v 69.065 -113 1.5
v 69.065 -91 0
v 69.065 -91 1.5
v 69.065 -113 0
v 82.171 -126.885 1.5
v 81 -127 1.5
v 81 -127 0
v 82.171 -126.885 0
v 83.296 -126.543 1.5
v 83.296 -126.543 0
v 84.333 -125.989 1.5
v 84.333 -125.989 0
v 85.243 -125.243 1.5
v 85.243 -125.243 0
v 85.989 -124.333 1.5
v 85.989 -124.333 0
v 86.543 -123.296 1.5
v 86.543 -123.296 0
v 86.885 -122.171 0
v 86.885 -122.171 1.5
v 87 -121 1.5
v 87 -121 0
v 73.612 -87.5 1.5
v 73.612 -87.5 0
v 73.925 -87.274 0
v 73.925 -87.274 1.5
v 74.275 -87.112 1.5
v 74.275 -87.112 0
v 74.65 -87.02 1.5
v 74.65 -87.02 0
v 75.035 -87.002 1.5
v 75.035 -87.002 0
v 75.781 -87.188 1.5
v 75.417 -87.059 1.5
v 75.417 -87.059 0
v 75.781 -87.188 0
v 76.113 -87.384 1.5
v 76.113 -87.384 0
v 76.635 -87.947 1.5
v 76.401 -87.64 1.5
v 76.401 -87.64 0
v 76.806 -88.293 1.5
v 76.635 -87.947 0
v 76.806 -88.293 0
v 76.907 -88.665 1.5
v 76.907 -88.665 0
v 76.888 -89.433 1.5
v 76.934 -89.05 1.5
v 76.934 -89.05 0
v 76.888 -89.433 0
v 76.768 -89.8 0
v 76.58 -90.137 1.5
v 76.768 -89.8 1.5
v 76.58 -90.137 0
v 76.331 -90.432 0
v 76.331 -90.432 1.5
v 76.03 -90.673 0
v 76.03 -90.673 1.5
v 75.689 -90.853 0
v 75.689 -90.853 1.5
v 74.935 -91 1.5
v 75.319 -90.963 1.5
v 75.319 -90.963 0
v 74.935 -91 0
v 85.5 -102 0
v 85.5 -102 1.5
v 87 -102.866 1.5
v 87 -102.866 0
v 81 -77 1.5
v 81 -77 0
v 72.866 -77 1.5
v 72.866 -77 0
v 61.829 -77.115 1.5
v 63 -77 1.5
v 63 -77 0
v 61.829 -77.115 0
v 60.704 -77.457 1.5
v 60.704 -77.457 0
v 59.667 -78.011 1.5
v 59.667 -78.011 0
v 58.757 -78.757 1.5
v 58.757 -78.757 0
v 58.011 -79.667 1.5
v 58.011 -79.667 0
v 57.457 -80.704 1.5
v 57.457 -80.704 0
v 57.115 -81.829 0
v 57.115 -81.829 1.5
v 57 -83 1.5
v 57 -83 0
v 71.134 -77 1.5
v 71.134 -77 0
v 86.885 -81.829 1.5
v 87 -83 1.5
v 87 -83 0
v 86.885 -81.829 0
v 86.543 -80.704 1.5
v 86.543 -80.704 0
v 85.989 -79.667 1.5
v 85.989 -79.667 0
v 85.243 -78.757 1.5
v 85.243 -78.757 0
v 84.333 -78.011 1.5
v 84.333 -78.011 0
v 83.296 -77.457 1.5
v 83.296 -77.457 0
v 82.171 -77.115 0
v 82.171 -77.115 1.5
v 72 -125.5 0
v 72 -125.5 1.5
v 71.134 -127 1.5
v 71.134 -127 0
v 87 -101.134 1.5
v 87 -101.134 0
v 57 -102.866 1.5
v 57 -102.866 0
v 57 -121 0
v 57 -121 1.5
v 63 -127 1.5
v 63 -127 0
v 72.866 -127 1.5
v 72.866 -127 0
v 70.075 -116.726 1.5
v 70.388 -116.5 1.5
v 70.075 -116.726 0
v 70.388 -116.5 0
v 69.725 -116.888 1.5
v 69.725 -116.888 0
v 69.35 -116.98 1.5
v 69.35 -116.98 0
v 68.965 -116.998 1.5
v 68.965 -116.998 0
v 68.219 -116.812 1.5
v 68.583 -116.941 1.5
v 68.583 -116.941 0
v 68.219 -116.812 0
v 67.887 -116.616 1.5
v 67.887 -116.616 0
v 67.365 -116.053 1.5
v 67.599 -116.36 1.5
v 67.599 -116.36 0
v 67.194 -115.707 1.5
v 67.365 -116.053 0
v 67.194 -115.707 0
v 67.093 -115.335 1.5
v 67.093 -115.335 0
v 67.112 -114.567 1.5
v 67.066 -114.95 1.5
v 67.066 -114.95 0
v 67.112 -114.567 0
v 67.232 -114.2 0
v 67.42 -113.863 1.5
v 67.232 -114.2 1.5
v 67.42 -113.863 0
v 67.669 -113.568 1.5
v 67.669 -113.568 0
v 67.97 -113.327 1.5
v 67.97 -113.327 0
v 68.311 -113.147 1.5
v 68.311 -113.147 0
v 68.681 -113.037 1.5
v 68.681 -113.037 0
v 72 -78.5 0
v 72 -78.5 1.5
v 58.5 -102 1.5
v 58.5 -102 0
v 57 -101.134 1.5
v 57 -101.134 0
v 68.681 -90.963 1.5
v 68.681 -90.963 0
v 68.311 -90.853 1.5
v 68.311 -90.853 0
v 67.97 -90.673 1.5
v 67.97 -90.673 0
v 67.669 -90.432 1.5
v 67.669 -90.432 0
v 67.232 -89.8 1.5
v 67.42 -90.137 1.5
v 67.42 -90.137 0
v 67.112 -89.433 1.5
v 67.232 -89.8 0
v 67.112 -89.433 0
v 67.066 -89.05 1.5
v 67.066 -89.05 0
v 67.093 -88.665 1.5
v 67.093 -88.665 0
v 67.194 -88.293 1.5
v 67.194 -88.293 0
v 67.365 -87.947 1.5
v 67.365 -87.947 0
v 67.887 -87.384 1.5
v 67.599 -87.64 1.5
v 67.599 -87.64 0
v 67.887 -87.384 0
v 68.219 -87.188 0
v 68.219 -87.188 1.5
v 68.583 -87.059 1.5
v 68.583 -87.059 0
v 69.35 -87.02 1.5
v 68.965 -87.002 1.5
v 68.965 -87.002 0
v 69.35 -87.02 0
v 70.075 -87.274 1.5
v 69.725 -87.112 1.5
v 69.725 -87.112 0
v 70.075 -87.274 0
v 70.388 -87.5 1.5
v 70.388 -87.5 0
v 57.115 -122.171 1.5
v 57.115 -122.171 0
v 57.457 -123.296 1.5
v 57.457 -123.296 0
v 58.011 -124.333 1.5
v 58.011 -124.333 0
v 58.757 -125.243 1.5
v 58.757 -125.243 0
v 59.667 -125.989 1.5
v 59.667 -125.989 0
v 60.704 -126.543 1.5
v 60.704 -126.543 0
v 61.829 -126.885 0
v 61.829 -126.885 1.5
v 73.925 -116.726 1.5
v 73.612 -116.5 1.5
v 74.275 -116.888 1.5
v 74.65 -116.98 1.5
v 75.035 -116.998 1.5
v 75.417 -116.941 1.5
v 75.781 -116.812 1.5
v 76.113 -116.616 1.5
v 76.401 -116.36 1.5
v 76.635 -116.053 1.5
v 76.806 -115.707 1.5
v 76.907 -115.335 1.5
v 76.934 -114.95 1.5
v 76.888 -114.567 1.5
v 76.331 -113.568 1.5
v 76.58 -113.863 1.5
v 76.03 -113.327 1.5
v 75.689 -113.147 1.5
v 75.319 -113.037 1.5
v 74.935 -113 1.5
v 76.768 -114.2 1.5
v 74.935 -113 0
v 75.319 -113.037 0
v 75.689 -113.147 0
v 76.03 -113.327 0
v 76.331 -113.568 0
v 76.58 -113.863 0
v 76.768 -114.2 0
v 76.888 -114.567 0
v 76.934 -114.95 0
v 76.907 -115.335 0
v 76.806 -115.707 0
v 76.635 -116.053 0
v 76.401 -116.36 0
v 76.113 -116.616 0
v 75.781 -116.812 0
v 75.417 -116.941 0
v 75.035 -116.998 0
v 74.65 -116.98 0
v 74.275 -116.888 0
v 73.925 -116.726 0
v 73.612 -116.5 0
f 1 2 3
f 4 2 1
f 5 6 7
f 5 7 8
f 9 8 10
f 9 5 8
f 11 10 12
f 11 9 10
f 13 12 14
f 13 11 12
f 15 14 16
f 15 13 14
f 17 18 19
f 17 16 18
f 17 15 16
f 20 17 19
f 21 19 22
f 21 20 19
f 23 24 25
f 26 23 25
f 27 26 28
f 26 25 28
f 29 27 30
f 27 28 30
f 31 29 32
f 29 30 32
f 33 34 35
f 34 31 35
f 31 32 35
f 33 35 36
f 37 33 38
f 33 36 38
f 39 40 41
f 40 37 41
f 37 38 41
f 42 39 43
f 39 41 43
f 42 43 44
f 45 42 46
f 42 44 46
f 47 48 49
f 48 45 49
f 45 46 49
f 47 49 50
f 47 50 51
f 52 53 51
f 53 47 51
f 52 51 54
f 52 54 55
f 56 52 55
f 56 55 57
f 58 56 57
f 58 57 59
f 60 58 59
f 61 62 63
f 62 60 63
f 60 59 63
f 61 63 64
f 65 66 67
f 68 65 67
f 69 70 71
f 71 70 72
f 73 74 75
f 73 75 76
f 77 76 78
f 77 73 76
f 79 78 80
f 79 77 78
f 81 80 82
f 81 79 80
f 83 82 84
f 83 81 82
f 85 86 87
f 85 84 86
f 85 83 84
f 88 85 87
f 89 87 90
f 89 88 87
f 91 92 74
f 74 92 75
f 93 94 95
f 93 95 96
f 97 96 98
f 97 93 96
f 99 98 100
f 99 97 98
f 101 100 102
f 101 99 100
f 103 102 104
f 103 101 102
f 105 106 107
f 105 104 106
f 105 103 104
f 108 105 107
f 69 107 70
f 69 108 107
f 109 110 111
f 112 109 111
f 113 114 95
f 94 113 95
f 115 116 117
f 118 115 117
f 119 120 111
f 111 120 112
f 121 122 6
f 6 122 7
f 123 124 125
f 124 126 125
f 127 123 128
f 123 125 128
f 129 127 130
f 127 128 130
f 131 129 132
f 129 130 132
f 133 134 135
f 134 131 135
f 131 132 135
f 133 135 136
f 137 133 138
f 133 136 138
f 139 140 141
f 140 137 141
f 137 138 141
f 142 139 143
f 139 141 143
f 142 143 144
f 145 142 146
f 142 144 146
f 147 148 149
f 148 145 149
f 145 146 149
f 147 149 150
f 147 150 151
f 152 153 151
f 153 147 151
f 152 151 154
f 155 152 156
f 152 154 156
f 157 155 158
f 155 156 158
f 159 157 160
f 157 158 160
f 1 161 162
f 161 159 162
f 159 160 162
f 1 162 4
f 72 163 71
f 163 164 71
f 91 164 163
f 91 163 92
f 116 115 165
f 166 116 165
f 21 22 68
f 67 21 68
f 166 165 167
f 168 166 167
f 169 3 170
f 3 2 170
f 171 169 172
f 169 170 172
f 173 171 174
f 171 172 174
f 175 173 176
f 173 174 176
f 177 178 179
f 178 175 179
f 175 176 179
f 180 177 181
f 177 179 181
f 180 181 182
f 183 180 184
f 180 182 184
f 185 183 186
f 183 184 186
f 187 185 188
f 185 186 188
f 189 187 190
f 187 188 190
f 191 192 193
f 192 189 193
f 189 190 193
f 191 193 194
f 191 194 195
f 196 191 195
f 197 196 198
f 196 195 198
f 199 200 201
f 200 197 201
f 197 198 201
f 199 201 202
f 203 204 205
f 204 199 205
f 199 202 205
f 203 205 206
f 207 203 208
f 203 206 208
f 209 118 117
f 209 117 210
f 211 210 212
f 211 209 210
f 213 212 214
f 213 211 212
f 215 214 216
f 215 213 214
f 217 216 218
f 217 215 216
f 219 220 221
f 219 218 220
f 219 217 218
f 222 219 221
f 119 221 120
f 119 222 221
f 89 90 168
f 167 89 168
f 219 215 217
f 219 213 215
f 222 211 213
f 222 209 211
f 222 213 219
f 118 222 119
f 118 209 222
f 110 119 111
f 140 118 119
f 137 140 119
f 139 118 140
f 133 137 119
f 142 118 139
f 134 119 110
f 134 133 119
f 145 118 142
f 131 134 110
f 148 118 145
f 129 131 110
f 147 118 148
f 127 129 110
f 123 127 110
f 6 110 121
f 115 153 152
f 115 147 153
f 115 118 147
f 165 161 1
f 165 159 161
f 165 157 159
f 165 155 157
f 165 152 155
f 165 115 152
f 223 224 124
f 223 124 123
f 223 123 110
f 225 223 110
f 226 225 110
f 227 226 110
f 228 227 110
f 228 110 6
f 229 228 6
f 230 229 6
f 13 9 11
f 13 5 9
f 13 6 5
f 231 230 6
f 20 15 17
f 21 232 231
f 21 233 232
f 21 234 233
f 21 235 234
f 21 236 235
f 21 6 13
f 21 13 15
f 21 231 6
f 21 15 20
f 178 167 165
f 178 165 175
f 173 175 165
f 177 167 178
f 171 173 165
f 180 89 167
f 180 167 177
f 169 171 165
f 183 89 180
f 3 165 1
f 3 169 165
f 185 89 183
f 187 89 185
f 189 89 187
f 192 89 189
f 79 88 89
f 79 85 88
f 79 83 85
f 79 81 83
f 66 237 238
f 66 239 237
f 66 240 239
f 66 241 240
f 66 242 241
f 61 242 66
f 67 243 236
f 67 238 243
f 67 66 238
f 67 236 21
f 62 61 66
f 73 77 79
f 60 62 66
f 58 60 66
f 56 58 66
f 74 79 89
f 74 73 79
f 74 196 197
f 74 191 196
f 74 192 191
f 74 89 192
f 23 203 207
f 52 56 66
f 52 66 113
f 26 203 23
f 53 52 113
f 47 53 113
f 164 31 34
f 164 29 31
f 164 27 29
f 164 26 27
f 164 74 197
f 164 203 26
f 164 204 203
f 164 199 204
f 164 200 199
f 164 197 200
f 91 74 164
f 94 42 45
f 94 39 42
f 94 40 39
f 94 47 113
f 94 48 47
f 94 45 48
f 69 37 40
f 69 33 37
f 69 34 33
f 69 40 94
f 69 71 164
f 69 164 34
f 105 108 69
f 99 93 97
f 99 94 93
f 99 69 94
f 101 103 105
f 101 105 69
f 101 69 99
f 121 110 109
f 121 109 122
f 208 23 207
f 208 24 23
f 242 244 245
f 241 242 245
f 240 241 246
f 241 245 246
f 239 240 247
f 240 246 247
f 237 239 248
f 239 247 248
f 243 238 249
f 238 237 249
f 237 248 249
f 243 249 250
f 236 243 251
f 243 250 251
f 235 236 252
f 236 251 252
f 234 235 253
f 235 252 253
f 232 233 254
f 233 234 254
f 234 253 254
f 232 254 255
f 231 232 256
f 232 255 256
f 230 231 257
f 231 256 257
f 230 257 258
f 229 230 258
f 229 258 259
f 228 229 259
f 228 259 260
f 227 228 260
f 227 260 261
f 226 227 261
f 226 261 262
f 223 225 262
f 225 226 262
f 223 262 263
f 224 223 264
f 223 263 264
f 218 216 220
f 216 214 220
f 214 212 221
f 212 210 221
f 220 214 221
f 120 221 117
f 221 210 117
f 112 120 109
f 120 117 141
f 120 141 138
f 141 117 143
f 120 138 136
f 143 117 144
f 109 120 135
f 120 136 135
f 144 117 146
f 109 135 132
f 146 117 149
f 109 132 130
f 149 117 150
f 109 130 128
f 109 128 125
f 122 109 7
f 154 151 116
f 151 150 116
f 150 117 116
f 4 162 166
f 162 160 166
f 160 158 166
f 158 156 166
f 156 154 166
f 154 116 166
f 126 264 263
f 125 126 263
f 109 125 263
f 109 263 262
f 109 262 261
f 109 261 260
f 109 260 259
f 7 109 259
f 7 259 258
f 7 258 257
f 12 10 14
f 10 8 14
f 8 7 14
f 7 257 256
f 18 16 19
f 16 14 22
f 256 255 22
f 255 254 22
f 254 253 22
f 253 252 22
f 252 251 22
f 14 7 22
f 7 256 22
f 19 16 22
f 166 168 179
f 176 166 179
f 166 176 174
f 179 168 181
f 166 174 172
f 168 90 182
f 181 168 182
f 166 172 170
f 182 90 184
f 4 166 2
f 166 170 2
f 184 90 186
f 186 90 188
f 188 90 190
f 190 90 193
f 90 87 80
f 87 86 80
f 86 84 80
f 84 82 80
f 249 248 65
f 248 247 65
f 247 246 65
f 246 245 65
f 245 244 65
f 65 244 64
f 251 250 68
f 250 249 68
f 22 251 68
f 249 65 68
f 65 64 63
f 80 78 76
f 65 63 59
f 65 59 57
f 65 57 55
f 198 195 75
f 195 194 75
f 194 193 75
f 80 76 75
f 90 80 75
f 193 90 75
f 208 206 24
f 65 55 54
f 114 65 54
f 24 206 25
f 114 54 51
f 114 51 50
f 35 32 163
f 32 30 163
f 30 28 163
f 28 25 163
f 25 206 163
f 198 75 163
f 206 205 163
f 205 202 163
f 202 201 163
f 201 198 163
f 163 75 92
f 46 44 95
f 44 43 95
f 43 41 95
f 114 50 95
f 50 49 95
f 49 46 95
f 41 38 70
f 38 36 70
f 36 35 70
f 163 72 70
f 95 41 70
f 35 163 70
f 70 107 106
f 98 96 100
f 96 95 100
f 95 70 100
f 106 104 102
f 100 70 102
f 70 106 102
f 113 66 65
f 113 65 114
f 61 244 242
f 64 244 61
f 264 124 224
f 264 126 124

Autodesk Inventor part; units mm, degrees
ref_plane "YZ Plane" through (0, 0, 0) normal (1, 0, 0) x (0, 1, 0)
ref_plane "XZ Plane" through (0, 0, 0) normal (0, 1, 0) x (-1, 0, 0)
ref_plane "XY Plane" through (0, 0, 0) normal (0, 0, 1) x (1, 0, 0)
sketch "Sketch2" plane through (0, 0, 0) normal (0, 0, 1) x (1, 0, 0)
  line L0 (0, 0) -> (144, 0) construction
  line L1 (144, 0) -> (144, -204) construction
  line L2 (144, -204) -> (0, -204) construction
  line L3 (0, -204) -> (0, 0) construction
  circle A0 centre (135, -27) radius 3 construction
  circle A1 centre (122, -9) radius 3 construction
  circle A2 centre (135, -177) radius 3 construction
  circle A3 centre (122, -195) radius 3 construction
  circle A4 centre (22, -195) radius 3 construction
  circle A5 centre (9, -177) radius 3 construction
  circle A6 centre (9, -27) radius 3 construction
  circle A7 centre (22, -9) radius 3 construction
  line L4 (12, -12) -> (132, -12) construction
  line L5 (132, -12) -> (132, -192) construction
  line L6 (132, -192) -> (12, -192) construction
  line L7 (12, -192) -> (12, -12) construction
  circle A8 centre (22, -9) radius 2.925
  circle A9 centre (9, -27) radius 2.925
  circle A10 centre (122, -9) radius 2.925
  circle A11 centre (135, -27) radius 2.925
  circle A12 centre (135, -177) radius 2.925
  circle A13 centre (122, -195) radius 2.925
  circle A14 centre (22, -195) radius 2.925
  circle A15 centre (9, -177) radius 2.925
  line L8 (122, -9) -> (135, -9) construction
  line L9 (135, -9) -> (135, -27) construction
  line L10 (126, -27) -> (126, -18)
  line L11 (126, -18) -> (122, -18)
  line L12 (144, -27) -> (144, 0)
  line L13 (144, 0) -> (122, 0)
  line L14 (122, -195) -> (135, -195) construction
  line L15 (135, -195) -> (135, -177) construction
  line L16 (126, -177) -> (126, -186)
  line L17 (126, -186) -> (122, -186)
  line L18 (144, -177) -> (144, -204)
  line L19 (144, -204) -> (122, -204)
  line L20 (126, -27) -> (126, -177)
  line L21 (144, -177) -> (144, -27)
  line L22 (122, -9) -> (113, -9) construction
  line L23 (122, 0) -> (113, 0)
  line L24 (122, -18) -> (113, -18)
  line L25 (113, -18) -> (113, 0)
  line L26 (122, -195) -> (113, -195) construction
  line L27 (122, -204) -> (113, -204)
  line L28 (122, -186) -> (113, -186)
  line L29 (113, -186) -> (113, -204)
  line L30 (75.025, -87) -> (68.975, -87) construction
  line L31 (68.975, -87) -> (68.975, -117) construction
  line L32 (68.975, -117) -> (75.025, -117) construction
  line L33 (75.025, -117) -> (75.025, -87) construction
  line L34 (74.935, -87.5) -> (73.6121, -87.5)
  line L35 (69.065, -87.5) -> (69.065, -91)
  line L36 (69.065, -116.5) -> (70.3879, -116.5)
  line L37 (74.935, -116.5) -> (74.935, -113)
  arc A16 (73.6121, -116.5) -> (74.935, -113) centre (74.935, -115) ccw
  arc A17 (69.065, -113) -> (70.3879, -116.5) centre (69.065, -115) ccw
  arc A18 (74.935, -91) -> (73.6121, -87.5) centre (74.935, -89) ccw
  arc A19 (70.3879, -87.5) -> (69.065, -91) centre (69.065, -89) ccw
  line L38 (69.065, -91) -> (69.065, -113)
  line L39 (70.3879, -87.5) -> (69.065, -87.5)
  line L40 (73.6121, -87.5) -> (70.3879, -87.5)
  line L41 (74.935, -91) -> (74.935, -87.5)
  line L42 (74.935, -113) -> (74.935, -91)
  line L43 (70.3879, -116.5) -> (73.6121, -116.5)
  line L44 (73.6121, -116.5) -> (74.935, -116.5)
  line L45 (69.065, -113) -> (69.065, -116.5)
  arc A20 (69.065, -91) -> (70.3879, -87.5) centre (69.065, -89) ccw
  arc A21 (73.6121, -87.5) -> (74.935, -91) centre (74.935, -89) ccw
  arc A22 (74.935, -113) -> (73.6121, -116.5) centre (74.935, -115) ccw
  arc A23 (70.3879, -116.5) -> (69.065, -113) centre (69.065, -115) ccw
  line L46 (57, -127) -> (87, -127)
  line L47 (87, -127) -> (87, -77)
  line L48 (87, -77) -> (57, -77)
  line L49 (57, -77) -> (57, -127)
  point P0 (132, -102)
  point P1 (144, -102)
  point P2 (72, -12)
  point P3 (72, 0)
  point P4 (72, -87)
  point P5 (75.025, -102)
  point P6 (74.935, -102)
  point P7 (72, -87.5)
  point P8 (74.935, -102)
  point P9 (72, -87.5)
  point P10 (72, -77)
  point P11 (87, -102)
  dimension "d0" = 144
  dimension "d1" = 204
  dimension "d2" = 6
  dimension "d3" = 6
  dimension "d4" = 6
  dimension "d5" = 6
  dimension "d6" = 6
  dimension "d7" = 6
  dimension "d8" = 6
  dimension "d9" = 6
  dimension "d10" = 120
  dimension "d11" = 180
  dimension "d12" = 15
  dimension "d13" = 10
  dimension "d14" = 10
  dimension "d15" = 15
  dimension "d16" = 15
  dimension "d17" = 10
  dimension "d18" = 10
  dimension "d19" = 15
  dimension "d20" = 0.075
  dimension "d21" = 0.075
  dimension "d22" = 0.075
  dimension "d23" = 0.075
  dimension "d24" = 0.075
  dimension "d25" = 0.075
  dimension "d26" = 0.075
  dimension "d27" = 0.075
  dimension "d28" = 9
  dimension "d29" = 9
  dimension "d30" = 9
  dimension "d31" = 9
  dimension "d32" = 9
  dimension "d33" = 9
  dimension "d34" = 6.05
  dimension "d35" = 30
  dimension "d36" = 29
  dimension "d37" = 5.87
  dimension "d38" = 4
  dimension "d39" = 1.5
  dimension "d40" = 4
  dimension "d41" = 1.5
  dimension "d42" = 1.5
  dimension "d43" = 1.5
  dimension "d44" = 4
  dimension "d45" = 4
  dimension "d54" = 30
  dimension "d55" = 50
extrude "Extrusion1" add sketch "Sketch2" along normal blind 1.5 contours L49 L48 L47 L46
sketch "Sketch3" plane through (0, 0, 1.5) normal (0, 0, 1) x (1, 0, 0)
  line L0 (87, -77) -> (57, -77) construction
  line L1 (72, -77) -> (72, -78.5) construction
  line L2 (57, -127) -> (87, -127) construction
  line L3 (72, -127) -> (72, -125.5) construction
  line L4 (57, -77) -> (57, -127) construction
  line L5 (57, -102) -> (58.5, -102) construction
  line L6 (87, -127) -> (87, -77) construction
  line L7 (87, -102) -> (85.5, -102) construction
  line L8 (72, -78.5) -> (72.866, -77)
  line L9 (72, -78.5) -> (73.7321, -78.5) construction
  line L10 (72, -78.5) -> (71.134, -77)
  line L11 (71.134, -77) -> (72.866, -77)
  line L12 (72, -125.5) -> (72.866, -127)
  line L13 (72, -125.5) -> (71.134, -127)
  line L14 (72.866, -127) -> (71.134, -127)
  line L15 (58.5, -102) -> (57, -101.134)
  line L16 (57, -102.866) -> (58.5, -102)
  line L17 (57, -101.134) -> (57, -102.866)
  line L18 (85.5, -102) -> (87, -101.134)
  line L19 (85.5, -102) -> (87, -102.866)
  line L20 (87, -101.134) -> (87, -102.866)
  point P0 (0, 0)
  dimension "d59" = 1.5
  dimension "d60" = 1.5
  dimension "d61" = 1.5
  dimension "d62" = 1.5
  dimension "d63" = 60
  dimension "d64" = 60
  dimension "d65" = 60
  dimension "d66" = 60
  dimension "d67" = 60
extrude "Extrusion2" cut sketch "Sketch3" against normal blind 1.5
fillet "Fillet1" radius 6 4 edges at (57, -127, 0.75) (87, -127, 0.75) (87, -77, 0.75) (57, -77, 0.75)
equation "\"d0\" = d46"
equation "\"d1\" = d47"
equation "\"d2\" = d48"
equation "\"d3\" = d48"
equation "\"d4\" = d48"
equation "\"d5\" = d48"
equation "\"d6\" = d48"
equation "\"d7\" = d48"
equation "\"d8\" = d48"
equation "\"d9\" = d48"
equation "\"d10\" = d49"
equation "\"d11\" = d50"
equation "\"d12\" = d51"
equation "\"d13\" = d52"
equation "\"d14\" = d52"
equation "\"d15\" = d51"
equation "\"d16\" = d51"
equation "\"d17\" = d52"
equation "\"d18\" = d52"
equation "\"d19\" = d51"
equation "\"d20\" = d53"
equation "\"d21\" = d53"
equation "\"d22\" = d53"
equation "\"d23\" = d53"
equation "\"d24\" = d53"
equation "\"d25\" = d53"
equation "\"d26\" = d53"
equation "\"d27\" = d53"
equation "\"d28\" = 1.5 * d48"
equation "\"d29\" = 1.5 * d48"
equation "\"d30\" = 1.5 * d48"
equation "\"d31\" = 1.5 * d48"
equation "\"d32\" = 1.5 * d48"
equation "\"d33\" = 1.5 * d48"
equation "\"d40\" = d38"
equation "\"d41\" = d39"
equation "\"d42\" = d39"
equation "\"d43\" = d42"
equation "\"d44\" = d38"
equation "\"d45\" = d38"
equation "\"d60\" = d59"
equation "\"d61\" = d59"
equation "\"d62\" = d59"
equation "\"d46\" = 144"
equation "\"d47\" = 204"
equation "\"d48\" = 6"
equation "\"d49\" = 120"
equation "\"d50\" = 180"
equation "\"d51\" = 15"
equation "\"d52\" = 10"
equation "\"d53\" = 0.075"
properties part number "pcb-holder"
